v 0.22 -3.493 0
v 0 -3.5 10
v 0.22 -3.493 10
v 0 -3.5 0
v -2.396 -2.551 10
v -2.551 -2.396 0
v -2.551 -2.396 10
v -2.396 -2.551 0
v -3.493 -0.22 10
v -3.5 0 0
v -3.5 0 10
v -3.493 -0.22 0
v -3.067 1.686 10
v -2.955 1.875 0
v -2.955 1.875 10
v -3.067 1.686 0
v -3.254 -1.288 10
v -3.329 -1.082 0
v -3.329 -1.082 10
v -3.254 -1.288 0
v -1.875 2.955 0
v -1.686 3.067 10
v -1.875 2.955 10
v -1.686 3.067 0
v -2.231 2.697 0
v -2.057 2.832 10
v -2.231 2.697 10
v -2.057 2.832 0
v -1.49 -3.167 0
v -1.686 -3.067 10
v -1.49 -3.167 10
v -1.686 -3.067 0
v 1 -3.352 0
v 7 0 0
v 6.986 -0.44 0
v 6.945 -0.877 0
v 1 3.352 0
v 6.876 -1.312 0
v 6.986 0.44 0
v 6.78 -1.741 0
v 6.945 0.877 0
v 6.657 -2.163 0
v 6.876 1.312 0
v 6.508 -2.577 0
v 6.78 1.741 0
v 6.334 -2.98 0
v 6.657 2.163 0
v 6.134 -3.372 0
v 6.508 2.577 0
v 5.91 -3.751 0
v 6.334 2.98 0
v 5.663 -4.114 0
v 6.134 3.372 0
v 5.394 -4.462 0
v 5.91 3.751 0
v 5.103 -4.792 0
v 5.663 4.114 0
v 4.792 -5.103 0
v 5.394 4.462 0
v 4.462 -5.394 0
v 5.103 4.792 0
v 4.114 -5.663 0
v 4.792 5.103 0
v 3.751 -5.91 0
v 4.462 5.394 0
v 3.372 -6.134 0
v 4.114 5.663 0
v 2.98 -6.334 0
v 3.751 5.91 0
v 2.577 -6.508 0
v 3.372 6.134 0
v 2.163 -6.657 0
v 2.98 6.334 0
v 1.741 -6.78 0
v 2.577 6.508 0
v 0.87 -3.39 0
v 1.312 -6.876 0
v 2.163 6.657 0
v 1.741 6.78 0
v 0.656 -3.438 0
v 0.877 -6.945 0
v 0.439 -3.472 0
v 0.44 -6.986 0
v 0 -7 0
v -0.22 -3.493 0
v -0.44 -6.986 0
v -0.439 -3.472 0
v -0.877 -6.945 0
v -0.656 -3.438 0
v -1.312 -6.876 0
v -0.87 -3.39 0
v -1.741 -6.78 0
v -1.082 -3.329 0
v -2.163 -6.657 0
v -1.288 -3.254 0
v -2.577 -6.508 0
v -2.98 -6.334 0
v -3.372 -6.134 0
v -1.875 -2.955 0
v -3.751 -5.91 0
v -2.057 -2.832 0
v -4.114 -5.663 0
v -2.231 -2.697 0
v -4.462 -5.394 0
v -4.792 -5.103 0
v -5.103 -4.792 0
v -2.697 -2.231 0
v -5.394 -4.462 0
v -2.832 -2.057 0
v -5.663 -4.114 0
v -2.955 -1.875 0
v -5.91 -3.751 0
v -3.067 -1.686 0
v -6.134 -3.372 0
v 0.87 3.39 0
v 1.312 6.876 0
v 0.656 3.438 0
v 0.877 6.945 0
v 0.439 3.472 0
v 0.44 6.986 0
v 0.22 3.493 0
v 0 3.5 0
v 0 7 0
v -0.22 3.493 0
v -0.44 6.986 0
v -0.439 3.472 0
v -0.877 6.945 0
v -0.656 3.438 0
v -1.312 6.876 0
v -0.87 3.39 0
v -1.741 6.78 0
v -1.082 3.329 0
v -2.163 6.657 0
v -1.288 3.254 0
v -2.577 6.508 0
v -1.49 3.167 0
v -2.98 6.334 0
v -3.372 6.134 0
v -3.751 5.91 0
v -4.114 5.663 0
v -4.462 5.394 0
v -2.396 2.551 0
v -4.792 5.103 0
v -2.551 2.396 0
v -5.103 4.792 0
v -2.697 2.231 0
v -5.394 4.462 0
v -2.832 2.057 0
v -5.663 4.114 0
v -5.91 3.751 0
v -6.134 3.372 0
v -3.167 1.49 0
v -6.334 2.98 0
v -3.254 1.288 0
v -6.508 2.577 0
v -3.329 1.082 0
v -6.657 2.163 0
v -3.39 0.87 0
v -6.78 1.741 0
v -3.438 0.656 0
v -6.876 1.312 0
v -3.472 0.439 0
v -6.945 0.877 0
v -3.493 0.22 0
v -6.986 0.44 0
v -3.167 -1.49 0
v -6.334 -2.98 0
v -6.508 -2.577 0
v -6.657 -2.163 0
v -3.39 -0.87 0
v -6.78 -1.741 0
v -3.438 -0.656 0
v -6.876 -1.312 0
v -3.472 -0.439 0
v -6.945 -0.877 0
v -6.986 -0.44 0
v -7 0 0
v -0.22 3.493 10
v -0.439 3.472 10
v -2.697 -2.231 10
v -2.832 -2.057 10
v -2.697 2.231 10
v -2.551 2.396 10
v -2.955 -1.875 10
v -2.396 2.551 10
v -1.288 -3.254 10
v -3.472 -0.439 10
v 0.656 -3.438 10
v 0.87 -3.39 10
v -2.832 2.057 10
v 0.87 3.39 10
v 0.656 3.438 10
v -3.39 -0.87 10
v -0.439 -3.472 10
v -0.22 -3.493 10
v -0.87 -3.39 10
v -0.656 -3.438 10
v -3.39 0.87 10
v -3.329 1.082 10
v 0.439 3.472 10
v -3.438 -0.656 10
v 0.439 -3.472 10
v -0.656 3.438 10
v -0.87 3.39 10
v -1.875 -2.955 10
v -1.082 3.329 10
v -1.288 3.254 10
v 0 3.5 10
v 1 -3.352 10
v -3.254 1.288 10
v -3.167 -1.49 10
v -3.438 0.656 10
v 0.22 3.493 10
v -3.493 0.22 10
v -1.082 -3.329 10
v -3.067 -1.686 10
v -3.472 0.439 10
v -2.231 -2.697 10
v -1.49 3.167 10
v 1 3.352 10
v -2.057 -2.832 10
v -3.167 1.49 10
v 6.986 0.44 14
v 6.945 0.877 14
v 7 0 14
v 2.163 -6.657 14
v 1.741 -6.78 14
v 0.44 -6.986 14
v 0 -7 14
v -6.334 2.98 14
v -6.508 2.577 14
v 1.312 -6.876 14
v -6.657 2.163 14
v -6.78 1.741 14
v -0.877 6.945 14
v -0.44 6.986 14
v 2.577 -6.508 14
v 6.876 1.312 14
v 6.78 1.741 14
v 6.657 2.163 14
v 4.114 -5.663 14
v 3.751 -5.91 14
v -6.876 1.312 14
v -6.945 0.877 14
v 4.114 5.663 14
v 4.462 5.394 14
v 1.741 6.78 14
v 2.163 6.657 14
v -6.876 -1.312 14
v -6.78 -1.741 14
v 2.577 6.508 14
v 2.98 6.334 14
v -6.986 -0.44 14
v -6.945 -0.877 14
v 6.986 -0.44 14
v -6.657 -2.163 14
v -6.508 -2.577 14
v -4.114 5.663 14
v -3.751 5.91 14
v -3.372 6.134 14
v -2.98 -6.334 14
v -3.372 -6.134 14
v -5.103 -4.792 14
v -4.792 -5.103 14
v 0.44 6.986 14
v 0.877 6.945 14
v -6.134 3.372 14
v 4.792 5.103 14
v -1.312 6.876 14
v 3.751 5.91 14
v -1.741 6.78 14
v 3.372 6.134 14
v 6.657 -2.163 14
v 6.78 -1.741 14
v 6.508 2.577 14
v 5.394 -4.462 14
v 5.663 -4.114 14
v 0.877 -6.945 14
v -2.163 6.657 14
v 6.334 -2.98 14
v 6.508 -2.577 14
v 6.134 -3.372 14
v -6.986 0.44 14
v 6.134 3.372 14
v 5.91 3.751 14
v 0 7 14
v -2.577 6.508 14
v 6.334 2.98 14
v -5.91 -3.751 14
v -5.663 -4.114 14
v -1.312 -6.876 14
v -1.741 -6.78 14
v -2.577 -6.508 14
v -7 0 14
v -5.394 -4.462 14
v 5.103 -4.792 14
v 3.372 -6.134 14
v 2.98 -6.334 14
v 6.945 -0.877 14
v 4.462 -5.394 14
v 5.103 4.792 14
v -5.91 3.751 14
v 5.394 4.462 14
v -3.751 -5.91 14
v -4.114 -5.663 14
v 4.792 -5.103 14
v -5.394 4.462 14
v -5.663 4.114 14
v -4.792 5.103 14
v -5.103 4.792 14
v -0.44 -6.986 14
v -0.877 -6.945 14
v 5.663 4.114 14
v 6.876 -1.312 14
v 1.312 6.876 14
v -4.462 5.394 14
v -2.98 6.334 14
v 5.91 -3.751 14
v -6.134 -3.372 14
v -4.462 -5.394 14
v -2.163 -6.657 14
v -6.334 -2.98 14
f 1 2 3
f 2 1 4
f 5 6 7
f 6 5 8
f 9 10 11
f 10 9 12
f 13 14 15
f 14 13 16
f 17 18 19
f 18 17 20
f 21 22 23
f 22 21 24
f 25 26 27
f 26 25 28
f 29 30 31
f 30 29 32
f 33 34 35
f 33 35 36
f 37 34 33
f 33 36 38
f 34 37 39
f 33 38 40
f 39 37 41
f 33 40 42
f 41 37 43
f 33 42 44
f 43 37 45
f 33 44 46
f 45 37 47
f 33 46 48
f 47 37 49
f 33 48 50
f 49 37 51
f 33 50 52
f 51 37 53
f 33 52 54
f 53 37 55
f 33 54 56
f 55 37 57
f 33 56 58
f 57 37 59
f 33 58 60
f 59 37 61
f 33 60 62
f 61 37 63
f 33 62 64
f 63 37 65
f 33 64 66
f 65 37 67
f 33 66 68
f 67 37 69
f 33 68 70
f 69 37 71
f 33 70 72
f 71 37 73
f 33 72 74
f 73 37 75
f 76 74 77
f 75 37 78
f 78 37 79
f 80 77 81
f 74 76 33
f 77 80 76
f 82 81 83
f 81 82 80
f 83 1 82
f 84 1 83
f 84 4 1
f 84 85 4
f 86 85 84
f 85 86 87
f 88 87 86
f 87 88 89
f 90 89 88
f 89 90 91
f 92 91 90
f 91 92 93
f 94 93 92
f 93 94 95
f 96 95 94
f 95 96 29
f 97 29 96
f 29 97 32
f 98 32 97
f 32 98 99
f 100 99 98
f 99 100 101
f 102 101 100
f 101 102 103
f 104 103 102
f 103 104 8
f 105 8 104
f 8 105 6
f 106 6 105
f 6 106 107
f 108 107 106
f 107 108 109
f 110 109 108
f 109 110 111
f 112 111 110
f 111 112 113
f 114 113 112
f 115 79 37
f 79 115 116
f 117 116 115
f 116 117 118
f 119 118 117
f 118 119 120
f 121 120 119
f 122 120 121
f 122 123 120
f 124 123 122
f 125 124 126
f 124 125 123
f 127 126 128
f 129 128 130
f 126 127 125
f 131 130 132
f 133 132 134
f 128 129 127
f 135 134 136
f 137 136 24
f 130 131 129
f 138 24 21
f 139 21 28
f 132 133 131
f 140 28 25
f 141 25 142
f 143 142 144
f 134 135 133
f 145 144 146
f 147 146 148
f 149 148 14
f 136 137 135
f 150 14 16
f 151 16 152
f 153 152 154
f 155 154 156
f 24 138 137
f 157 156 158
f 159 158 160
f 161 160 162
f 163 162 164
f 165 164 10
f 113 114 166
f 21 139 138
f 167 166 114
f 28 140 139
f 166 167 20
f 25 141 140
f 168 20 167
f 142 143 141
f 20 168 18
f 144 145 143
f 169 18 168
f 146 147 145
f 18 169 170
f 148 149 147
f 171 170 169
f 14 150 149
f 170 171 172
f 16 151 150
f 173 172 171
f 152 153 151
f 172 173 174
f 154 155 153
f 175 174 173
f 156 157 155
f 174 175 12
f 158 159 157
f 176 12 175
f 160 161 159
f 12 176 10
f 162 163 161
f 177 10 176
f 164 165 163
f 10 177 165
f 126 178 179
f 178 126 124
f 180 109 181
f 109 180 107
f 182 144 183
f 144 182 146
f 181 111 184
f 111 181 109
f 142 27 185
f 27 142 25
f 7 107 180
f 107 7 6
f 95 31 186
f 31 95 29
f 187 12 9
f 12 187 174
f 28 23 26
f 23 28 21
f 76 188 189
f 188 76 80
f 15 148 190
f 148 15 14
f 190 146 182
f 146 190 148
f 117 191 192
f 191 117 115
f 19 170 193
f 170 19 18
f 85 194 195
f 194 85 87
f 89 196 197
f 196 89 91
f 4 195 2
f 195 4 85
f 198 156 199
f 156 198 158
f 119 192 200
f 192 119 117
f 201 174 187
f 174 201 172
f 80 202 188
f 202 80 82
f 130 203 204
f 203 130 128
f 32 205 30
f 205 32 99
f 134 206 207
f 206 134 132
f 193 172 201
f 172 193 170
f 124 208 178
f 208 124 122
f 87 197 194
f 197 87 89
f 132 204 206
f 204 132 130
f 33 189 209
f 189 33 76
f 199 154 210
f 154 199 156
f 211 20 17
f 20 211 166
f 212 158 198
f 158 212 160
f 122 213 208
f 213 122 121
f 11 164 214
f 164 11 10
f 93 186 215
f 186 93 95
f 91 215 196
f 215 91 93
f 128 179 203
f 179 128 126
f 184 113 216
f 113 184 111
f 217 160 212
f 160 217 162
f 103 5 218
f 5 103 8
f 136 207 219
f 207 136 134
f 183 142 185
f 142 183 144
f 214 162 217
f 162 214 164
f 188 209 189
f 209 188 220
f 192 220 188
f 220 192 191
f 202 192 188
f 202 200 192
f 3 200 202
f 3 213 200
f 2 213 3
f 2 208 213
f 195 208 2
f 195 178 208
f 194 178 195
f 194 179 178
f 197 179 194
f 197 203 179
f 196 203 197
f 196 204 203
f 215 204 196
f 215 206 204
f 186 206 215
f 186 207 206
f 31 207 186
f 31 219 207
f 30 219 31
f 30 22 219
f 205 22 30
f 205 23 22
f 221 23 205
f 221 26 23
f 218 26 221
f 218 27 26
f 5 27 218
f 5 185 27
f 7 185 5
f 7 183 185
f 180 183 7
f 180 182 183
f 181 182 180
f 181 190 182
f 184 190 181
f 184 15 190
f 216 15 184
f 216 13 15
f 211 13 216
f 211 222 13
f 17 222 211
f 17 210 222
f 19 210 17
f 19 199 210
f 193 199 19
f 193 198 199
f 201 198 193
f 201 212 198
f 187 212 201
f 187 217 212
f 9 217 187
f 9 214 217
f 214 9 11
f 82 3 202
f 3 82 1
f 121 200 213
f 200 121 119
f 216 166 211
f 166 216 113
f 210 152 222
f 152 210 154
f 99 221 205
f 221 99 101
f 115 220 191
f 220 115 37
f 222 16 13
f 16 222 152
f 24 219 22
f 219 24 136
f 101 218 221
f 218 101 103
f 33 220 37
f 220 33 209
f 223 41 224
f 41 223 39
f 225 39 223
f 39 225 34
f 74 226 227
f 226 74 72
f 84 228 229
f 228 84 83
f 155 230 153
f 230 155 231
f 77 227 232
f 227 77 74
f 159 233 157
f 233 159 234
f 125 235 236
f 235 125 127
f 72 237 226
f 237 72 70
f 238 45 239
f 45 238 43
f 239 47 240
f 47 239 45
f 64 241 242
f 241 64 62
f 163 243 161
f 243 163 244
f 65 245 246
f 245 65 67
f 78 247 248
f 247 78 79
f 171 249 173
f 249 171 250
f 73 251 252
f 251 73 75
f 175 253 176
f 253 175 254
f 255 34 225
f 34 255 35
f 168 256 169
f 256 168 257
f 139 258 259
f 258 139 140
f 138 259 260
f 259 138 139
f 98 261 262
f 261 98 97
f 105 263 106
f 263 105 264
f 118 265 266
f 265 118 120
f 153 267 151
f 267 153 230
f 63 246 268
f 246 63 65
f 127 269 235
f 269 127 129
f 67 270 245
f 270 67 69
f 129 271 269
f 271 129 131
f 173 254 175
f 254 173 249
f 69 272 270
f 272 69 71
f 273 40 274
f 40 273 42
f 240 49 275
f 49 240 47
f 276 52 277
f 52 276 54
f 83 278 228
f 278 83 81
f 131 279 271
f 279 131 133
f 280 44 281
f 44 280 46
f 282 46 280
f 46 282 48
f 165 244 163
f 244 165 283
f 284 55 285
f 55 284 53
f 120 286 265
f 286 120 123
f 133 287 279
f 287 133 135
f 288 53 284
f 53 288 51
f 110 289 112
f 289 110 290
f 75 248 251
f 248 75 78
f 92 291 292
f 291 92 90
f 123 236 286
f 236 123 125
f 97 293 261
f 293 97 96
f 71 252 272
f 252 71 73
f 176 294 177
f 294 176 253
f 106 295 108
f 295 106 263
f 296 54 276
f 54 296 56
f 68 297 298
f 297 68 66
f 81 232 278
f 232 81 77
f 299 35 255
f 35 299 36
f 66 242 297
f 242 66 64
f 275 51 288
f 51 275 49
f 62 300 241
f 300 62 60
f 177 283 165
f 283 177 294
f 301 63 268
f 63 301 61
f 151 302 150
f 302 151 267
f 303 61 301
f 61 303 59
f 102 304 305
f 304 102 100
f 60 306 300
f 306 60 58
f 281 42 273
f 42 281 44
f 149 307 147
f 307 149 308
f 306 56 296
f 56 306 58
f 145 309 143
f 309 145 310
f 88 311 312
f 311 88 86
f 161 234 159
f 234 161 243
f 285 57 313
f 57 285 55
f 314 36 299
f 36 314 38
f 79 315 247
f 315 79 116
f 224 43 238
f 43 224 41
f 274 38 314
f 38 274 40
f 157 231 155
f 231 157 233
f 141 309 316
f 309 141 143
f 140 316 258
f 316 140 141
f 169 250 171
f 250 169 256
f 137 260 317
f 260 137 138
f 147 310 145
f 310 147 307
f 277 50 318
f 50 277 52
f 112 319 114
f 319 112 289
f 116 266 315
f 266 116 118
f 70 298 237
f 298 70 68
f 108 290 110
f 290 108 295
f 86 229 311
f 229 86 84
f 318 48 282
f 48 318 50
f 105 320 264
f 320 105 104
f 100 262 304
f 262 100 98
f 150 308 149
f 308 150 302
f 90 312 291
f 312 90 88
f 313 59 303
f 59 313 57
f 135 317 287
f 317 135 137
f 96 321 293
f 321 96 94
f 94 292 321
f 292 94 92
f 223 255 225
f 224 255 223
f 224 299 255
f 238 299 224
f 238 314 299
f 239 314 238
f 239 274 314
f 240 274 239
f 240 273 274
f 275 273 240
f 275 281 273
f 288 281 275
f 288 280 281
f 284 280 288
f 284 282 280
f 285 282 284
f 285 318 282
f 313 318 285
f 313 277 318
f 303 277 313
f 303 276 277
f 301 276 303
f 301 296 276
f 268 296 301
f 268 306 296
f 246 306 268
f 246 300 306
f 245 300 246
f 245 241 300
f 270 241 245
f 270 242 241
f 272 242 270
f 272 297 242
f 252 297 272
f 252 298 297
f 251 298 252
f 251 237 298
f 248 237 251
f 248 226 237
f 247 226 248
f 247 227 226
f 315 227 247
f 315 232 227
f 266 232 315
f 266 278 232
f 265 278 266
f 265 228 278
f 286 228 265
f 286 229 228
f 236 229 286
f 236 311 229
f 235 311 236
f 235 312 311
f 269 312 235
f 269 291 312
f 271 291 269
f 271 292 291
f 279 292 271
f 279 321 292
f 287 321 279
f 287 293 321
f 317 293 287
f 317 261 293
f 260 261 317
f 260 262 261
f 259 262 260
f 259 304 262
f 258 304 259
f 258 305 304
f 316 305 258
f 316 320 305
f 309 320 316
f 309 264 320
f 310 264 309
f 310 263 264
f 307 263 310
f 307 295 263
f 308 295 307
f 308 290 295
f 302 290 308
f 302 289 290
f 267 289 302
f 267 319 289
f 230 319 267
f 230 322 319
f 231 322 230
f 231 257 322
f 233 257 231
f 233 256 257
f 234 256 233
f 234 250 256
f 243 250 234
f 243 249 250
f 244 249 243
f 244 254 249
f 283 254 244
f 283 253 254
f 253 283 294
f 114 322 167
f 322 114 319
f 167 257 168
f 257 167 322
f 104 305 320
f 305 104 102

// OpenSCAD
height = 14;  // ノブの高さ
radius = 7;   // ノブの半径

stem_height = 10;   // 軸の長さ
stem_radius = 3.5;  // 軸の半径


difference() {
  // 外形
  cylinder(h=height, r=radius, $fn=100);
  difference() {
    // 軸
    cylinder(h=stem_height, r=stem_radius, $fn=100);
    translate([1.,-5])
    // 軸の切り欠き部分を作る
    cube(10, false);
  }
}
